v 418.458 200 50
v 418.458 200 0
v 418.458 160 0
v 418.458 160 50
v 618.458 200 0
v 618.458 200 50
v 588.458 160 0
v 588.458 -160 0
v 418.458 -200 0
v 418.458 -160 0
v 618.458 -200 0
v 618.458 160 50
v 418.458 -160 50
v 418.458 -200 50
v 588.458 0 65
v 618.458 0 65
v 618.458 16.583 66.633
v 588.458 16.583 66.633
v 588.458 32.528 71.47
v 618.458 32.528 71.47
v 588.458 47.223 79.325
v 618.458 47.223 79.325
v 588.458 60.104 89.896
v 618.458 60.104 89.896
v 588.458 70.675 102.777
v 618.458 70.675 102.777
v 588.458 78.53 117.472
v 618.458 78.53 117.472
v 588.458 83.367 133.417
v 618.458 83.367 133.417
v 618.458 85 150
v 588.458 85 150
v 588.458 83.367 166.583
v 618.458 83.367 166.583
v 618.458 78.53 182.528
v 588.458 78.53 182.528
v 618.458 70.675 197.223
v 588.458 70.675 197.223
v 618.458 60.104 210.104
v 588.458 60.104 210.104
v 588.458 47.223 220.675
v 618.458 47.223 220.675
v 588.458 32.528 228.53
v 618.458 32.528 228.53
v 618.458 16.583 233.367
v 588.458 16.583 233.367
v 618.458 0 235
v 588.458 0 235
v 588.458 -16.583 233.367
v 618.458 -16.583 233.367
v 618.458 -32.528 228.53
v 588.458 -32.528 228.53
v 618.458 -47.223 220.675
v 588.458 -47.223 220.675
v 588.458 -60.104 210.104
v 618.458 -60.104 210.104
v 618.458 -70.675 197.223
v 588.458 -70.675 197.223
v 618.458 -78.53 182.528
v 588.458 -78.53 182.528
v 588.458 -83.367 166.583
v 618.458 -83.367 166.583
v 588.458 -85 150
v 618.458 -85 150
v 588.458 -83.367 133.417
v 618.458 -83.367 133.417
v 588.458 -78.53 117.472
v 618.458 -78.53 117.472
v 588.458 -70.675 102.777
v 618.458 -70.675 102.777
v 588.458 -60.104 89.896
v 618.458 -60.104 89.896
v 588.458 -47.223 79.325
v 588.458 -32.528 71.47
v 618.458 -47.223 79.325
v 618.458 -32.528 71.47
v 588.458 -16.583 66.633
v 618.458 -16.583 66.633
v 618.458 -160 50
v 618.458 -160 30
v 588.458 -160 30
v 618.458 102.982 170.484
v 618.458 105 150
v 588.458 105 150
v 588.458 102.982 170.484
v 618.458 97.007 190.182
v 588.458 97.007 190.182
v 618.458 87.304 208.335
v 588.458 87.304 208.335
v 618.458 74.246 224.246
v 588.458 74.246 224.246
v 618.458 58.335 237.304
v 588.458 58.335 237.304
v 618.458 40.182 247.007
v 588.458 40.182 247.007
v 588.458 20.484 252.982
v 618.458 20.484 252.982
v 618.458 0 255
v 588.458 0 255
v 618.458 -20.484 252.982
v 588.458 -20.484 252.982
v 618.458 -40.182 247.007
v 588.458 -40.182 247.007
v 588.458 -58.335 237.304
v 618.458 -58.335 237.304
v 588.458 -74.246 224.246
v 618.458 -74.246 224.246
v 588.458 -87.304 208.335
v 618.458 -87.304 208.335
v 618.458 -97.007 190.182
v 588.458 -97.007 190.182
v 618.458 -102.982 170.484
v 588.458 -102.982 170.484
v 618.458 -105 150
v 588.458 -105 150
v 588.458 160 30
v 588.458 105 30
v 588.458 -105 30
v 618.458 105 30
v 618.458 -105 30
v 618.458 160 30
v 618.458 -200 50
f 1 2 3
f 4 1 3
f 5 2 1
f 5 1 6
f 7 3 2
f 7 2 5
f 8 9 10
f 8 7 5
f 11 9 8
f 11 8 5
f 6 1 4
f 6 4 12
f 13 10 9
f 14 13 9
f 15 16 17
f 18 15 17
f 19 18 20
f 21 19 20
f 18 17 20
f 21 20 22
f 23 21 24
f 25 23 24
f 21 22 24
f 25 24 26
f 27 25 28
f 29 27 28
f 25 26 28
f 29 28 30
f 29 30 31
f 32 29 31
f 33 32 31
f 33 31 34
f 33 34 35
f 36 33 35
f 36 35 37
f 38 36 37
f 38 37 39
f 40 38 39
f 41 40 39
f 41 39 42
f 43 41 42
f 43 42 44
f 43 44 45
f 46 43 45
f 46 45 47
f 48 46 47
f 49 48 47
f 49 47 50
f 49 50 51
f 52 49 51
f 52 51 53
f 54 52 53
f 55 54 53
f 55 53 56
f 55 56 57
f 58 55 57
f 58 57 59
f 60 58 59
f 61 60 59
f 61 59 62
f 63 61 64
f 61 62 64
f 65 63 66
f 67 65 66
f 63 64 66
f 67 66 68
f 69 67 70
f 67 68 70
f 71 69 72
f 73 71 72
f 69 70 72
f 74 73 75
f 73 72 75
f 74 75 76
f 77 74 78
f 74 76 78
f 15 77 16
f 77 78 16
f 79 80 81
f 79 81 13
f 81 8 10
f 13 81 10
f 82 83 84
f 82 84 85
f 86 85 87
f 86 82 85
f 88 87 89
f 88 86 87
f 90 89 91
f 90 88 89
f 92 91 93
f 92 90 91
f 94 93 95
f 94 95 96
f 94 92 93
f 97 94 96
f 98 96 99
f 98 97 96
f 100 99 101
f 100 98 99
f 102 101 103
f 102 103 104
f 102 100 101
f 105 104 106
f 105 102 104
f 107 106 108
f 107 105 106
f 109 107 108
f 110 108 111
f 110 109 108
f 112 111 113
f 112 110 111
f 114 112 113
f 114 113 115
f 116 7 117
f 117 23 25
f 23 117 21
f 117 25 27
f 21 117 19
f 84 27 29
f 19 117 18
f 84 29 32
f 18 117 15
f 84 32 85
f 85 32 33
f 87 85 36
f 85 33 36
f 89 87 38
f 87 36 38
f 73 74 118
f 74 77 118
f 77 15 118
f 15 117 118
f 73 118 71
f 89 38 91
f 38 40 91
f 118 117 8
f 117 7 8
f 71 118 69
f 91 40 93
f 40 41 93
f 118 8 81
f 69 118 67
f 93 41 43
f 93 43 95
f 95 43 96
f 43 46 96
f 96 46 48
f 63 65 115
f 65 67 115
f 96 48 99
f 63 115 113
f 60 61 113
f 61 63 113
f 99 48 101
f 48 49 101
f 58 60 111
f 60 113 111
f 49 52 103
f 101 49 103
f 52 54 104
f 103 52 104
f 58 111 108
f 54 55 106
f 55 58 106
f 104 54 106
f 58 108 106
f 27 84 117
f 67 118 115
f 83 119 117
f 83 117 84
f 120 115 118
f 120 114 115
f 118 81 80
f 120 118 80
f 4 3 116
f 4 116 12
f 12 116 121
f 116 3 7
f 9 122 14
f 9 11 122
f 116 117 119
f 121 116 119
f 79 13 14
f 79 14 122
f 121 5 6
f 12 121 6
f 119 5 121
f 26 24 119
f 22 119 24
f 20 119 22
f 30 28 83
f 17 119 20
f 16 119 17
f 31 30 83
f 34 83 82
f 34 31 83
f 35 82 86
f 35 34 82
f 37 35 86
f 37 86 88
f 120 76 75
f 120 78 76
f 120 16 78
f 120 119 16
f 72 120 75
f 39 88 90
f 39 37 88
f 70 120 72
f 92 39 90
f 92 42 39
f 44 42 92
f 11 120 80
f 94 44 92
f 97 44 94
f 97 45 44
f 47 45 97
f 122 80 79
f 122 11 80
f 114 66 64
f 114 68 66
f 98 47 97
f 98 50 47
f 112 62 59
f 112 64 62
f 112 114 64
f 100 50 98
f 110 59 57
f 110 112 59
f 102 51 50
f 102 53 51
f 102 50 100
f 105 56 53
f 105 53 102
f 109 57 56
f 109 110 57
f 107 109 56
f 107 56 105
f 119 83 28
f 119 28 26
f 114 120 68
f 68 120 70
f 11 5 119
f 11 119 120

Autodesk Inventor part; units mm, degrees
ref_plane "YZ Plane" through (0, 0, 0) normal (1, 0, 0) x (0, 1, 0)
ref_plane "XZ Plane" through (0, 0, 0) normal (0, 1, 0) x (-1, 0, 0)
ref_plane "XY Plane" through (0, 0, 0) normal (0, 0, 1) x (1, 0, 0)
sketch "Sketch1" plane through (0, 0, 0) normal (0, 0, 1) x (1, 0, 0)
  line L0 (40, 160) -> (876.7461, 160) projected
  line L1 (876.7461, 160) -> (876.7461, -160) projected
  line L2 (876.7461, -160) -> (40, -160) projected
  line L3 (40, -200) -> (40, -160) projected
  line L4 (916.7461, -200) -> (40, -200) projected
  line L5 (916.7461, -160) -> (916.7461, -200) projected
  line L6 (916.7461, 160) -> (916.7461, -160) projected
  line L7 (916.7461, 200) -> (916.7461, 160) projected
  line L8 (40, 200) -> (916.7461, 200) projected
  line L9 (40, 160) -> (40, 200) projected
  line L10 (618.4585, 200) -> (418.4585, 200)
  line L11 (418.4585, 200) -> (418.4585, 160)
  line L12 (418.4585, 160) -> (618.4585, 160)
  line L13 (618.4585, 160) -> (618.4585, 200)
  line L14 (618.4585, -160) -> (418.4585, -160)
  line L15 (418.4585, -160) -> (418.4585, -200)
  line L16 (418.4585, -200) -> (618.4585, -200)
  line L17 (618.4585, -200) -> (618.4585, -160)
  point P0 (0, 0)
  dimension "d0" = 200
extrude "Extrusion1" add sketch "Sketch1" along normal blind 50 contours L11 L8 L13 L0 | L17 L4 L15 L2
sketch "Sketch2" plane through (418.4585, -160, 0) normal (0, 1, 0) x (1, 0, 0)
  arc A0 (78.7868, -178.7868) -> (121.2132, -178.7868) centre (100, -157.5736) ccw projected
  arc A1 (78.7868, -178.7868) -> (121.2132, -178.7868) centre (100, -157.5736) ccw projected
  circle A2 centre (100, -157.5736) radius 10
  line L0 (0, 0) -> (0, -50) projected
  line L1 (0, 0) -> (200, 0) projected
  line L2 (200, 0) -> (200, -50) projected
  line L3 (200, 0) -> (200, -87.5736) projected
  line L4 (200, 0) -> (170, 0)
  line L5 (170, 0) -> (170, -30)
  line L6 (170, -30) -> (200, -30)
  line L7 (200, -30) -> (200, 0)
  line L8 (0, -50) -> (200, -50) projected
  point P0 (-418.4585, 0)
  dimension "d7" = 20
  dimension "d10" = 30
  dimension "d11" = 30
extrude "Extrusion2" add sketch "Sketch2" along normal up to next contours L1 L2 L6 L5
sketch "Sketch3" plane through (618.4585, -200, 0) normal (1, 0, 0) x (0, 0, -1)
  line L0 (-30, 40) -> (-30, 360) projected
  line L1 (-30, 40) -> (-50, 40) projected
  line L2 (-50, 0) -> (-50, 40) projected
  line L3 (0, 0) -> (-50, 0) projected
  line L4 (0, 0) -> (0, 400) projected
  line L5 (0, 400) -> (-50, 400) projected
  line L6 (-50, 360) -> (-50, 400) projected
  line L7 (-30, 360) -> (-50, 360) projected
  line L8 (-30, 40) -> (-30, 360) projected
  line L9 (-30, 305) -> (-150, 305)
  arc A0 (-150, 305) -> (-150, 95) centre (-150, 200) ccw
  line L10 (-150, 95) -> (-30, 95)
  line L11 (-30, 305) -> (-30, 95)
  circle A1 centre (-150, 200) radius 85
  point P0 (0, 200)
  point P1 (0, 200)
  dimension "d13" = 170
  dimension "d14" = 20
  dimension "d15" = 120
extrude "Extrusion3" add sketch "Sketch3" against normal blind 30 contours L10 A0 L9 L0
properties part number "emmerhouder"
